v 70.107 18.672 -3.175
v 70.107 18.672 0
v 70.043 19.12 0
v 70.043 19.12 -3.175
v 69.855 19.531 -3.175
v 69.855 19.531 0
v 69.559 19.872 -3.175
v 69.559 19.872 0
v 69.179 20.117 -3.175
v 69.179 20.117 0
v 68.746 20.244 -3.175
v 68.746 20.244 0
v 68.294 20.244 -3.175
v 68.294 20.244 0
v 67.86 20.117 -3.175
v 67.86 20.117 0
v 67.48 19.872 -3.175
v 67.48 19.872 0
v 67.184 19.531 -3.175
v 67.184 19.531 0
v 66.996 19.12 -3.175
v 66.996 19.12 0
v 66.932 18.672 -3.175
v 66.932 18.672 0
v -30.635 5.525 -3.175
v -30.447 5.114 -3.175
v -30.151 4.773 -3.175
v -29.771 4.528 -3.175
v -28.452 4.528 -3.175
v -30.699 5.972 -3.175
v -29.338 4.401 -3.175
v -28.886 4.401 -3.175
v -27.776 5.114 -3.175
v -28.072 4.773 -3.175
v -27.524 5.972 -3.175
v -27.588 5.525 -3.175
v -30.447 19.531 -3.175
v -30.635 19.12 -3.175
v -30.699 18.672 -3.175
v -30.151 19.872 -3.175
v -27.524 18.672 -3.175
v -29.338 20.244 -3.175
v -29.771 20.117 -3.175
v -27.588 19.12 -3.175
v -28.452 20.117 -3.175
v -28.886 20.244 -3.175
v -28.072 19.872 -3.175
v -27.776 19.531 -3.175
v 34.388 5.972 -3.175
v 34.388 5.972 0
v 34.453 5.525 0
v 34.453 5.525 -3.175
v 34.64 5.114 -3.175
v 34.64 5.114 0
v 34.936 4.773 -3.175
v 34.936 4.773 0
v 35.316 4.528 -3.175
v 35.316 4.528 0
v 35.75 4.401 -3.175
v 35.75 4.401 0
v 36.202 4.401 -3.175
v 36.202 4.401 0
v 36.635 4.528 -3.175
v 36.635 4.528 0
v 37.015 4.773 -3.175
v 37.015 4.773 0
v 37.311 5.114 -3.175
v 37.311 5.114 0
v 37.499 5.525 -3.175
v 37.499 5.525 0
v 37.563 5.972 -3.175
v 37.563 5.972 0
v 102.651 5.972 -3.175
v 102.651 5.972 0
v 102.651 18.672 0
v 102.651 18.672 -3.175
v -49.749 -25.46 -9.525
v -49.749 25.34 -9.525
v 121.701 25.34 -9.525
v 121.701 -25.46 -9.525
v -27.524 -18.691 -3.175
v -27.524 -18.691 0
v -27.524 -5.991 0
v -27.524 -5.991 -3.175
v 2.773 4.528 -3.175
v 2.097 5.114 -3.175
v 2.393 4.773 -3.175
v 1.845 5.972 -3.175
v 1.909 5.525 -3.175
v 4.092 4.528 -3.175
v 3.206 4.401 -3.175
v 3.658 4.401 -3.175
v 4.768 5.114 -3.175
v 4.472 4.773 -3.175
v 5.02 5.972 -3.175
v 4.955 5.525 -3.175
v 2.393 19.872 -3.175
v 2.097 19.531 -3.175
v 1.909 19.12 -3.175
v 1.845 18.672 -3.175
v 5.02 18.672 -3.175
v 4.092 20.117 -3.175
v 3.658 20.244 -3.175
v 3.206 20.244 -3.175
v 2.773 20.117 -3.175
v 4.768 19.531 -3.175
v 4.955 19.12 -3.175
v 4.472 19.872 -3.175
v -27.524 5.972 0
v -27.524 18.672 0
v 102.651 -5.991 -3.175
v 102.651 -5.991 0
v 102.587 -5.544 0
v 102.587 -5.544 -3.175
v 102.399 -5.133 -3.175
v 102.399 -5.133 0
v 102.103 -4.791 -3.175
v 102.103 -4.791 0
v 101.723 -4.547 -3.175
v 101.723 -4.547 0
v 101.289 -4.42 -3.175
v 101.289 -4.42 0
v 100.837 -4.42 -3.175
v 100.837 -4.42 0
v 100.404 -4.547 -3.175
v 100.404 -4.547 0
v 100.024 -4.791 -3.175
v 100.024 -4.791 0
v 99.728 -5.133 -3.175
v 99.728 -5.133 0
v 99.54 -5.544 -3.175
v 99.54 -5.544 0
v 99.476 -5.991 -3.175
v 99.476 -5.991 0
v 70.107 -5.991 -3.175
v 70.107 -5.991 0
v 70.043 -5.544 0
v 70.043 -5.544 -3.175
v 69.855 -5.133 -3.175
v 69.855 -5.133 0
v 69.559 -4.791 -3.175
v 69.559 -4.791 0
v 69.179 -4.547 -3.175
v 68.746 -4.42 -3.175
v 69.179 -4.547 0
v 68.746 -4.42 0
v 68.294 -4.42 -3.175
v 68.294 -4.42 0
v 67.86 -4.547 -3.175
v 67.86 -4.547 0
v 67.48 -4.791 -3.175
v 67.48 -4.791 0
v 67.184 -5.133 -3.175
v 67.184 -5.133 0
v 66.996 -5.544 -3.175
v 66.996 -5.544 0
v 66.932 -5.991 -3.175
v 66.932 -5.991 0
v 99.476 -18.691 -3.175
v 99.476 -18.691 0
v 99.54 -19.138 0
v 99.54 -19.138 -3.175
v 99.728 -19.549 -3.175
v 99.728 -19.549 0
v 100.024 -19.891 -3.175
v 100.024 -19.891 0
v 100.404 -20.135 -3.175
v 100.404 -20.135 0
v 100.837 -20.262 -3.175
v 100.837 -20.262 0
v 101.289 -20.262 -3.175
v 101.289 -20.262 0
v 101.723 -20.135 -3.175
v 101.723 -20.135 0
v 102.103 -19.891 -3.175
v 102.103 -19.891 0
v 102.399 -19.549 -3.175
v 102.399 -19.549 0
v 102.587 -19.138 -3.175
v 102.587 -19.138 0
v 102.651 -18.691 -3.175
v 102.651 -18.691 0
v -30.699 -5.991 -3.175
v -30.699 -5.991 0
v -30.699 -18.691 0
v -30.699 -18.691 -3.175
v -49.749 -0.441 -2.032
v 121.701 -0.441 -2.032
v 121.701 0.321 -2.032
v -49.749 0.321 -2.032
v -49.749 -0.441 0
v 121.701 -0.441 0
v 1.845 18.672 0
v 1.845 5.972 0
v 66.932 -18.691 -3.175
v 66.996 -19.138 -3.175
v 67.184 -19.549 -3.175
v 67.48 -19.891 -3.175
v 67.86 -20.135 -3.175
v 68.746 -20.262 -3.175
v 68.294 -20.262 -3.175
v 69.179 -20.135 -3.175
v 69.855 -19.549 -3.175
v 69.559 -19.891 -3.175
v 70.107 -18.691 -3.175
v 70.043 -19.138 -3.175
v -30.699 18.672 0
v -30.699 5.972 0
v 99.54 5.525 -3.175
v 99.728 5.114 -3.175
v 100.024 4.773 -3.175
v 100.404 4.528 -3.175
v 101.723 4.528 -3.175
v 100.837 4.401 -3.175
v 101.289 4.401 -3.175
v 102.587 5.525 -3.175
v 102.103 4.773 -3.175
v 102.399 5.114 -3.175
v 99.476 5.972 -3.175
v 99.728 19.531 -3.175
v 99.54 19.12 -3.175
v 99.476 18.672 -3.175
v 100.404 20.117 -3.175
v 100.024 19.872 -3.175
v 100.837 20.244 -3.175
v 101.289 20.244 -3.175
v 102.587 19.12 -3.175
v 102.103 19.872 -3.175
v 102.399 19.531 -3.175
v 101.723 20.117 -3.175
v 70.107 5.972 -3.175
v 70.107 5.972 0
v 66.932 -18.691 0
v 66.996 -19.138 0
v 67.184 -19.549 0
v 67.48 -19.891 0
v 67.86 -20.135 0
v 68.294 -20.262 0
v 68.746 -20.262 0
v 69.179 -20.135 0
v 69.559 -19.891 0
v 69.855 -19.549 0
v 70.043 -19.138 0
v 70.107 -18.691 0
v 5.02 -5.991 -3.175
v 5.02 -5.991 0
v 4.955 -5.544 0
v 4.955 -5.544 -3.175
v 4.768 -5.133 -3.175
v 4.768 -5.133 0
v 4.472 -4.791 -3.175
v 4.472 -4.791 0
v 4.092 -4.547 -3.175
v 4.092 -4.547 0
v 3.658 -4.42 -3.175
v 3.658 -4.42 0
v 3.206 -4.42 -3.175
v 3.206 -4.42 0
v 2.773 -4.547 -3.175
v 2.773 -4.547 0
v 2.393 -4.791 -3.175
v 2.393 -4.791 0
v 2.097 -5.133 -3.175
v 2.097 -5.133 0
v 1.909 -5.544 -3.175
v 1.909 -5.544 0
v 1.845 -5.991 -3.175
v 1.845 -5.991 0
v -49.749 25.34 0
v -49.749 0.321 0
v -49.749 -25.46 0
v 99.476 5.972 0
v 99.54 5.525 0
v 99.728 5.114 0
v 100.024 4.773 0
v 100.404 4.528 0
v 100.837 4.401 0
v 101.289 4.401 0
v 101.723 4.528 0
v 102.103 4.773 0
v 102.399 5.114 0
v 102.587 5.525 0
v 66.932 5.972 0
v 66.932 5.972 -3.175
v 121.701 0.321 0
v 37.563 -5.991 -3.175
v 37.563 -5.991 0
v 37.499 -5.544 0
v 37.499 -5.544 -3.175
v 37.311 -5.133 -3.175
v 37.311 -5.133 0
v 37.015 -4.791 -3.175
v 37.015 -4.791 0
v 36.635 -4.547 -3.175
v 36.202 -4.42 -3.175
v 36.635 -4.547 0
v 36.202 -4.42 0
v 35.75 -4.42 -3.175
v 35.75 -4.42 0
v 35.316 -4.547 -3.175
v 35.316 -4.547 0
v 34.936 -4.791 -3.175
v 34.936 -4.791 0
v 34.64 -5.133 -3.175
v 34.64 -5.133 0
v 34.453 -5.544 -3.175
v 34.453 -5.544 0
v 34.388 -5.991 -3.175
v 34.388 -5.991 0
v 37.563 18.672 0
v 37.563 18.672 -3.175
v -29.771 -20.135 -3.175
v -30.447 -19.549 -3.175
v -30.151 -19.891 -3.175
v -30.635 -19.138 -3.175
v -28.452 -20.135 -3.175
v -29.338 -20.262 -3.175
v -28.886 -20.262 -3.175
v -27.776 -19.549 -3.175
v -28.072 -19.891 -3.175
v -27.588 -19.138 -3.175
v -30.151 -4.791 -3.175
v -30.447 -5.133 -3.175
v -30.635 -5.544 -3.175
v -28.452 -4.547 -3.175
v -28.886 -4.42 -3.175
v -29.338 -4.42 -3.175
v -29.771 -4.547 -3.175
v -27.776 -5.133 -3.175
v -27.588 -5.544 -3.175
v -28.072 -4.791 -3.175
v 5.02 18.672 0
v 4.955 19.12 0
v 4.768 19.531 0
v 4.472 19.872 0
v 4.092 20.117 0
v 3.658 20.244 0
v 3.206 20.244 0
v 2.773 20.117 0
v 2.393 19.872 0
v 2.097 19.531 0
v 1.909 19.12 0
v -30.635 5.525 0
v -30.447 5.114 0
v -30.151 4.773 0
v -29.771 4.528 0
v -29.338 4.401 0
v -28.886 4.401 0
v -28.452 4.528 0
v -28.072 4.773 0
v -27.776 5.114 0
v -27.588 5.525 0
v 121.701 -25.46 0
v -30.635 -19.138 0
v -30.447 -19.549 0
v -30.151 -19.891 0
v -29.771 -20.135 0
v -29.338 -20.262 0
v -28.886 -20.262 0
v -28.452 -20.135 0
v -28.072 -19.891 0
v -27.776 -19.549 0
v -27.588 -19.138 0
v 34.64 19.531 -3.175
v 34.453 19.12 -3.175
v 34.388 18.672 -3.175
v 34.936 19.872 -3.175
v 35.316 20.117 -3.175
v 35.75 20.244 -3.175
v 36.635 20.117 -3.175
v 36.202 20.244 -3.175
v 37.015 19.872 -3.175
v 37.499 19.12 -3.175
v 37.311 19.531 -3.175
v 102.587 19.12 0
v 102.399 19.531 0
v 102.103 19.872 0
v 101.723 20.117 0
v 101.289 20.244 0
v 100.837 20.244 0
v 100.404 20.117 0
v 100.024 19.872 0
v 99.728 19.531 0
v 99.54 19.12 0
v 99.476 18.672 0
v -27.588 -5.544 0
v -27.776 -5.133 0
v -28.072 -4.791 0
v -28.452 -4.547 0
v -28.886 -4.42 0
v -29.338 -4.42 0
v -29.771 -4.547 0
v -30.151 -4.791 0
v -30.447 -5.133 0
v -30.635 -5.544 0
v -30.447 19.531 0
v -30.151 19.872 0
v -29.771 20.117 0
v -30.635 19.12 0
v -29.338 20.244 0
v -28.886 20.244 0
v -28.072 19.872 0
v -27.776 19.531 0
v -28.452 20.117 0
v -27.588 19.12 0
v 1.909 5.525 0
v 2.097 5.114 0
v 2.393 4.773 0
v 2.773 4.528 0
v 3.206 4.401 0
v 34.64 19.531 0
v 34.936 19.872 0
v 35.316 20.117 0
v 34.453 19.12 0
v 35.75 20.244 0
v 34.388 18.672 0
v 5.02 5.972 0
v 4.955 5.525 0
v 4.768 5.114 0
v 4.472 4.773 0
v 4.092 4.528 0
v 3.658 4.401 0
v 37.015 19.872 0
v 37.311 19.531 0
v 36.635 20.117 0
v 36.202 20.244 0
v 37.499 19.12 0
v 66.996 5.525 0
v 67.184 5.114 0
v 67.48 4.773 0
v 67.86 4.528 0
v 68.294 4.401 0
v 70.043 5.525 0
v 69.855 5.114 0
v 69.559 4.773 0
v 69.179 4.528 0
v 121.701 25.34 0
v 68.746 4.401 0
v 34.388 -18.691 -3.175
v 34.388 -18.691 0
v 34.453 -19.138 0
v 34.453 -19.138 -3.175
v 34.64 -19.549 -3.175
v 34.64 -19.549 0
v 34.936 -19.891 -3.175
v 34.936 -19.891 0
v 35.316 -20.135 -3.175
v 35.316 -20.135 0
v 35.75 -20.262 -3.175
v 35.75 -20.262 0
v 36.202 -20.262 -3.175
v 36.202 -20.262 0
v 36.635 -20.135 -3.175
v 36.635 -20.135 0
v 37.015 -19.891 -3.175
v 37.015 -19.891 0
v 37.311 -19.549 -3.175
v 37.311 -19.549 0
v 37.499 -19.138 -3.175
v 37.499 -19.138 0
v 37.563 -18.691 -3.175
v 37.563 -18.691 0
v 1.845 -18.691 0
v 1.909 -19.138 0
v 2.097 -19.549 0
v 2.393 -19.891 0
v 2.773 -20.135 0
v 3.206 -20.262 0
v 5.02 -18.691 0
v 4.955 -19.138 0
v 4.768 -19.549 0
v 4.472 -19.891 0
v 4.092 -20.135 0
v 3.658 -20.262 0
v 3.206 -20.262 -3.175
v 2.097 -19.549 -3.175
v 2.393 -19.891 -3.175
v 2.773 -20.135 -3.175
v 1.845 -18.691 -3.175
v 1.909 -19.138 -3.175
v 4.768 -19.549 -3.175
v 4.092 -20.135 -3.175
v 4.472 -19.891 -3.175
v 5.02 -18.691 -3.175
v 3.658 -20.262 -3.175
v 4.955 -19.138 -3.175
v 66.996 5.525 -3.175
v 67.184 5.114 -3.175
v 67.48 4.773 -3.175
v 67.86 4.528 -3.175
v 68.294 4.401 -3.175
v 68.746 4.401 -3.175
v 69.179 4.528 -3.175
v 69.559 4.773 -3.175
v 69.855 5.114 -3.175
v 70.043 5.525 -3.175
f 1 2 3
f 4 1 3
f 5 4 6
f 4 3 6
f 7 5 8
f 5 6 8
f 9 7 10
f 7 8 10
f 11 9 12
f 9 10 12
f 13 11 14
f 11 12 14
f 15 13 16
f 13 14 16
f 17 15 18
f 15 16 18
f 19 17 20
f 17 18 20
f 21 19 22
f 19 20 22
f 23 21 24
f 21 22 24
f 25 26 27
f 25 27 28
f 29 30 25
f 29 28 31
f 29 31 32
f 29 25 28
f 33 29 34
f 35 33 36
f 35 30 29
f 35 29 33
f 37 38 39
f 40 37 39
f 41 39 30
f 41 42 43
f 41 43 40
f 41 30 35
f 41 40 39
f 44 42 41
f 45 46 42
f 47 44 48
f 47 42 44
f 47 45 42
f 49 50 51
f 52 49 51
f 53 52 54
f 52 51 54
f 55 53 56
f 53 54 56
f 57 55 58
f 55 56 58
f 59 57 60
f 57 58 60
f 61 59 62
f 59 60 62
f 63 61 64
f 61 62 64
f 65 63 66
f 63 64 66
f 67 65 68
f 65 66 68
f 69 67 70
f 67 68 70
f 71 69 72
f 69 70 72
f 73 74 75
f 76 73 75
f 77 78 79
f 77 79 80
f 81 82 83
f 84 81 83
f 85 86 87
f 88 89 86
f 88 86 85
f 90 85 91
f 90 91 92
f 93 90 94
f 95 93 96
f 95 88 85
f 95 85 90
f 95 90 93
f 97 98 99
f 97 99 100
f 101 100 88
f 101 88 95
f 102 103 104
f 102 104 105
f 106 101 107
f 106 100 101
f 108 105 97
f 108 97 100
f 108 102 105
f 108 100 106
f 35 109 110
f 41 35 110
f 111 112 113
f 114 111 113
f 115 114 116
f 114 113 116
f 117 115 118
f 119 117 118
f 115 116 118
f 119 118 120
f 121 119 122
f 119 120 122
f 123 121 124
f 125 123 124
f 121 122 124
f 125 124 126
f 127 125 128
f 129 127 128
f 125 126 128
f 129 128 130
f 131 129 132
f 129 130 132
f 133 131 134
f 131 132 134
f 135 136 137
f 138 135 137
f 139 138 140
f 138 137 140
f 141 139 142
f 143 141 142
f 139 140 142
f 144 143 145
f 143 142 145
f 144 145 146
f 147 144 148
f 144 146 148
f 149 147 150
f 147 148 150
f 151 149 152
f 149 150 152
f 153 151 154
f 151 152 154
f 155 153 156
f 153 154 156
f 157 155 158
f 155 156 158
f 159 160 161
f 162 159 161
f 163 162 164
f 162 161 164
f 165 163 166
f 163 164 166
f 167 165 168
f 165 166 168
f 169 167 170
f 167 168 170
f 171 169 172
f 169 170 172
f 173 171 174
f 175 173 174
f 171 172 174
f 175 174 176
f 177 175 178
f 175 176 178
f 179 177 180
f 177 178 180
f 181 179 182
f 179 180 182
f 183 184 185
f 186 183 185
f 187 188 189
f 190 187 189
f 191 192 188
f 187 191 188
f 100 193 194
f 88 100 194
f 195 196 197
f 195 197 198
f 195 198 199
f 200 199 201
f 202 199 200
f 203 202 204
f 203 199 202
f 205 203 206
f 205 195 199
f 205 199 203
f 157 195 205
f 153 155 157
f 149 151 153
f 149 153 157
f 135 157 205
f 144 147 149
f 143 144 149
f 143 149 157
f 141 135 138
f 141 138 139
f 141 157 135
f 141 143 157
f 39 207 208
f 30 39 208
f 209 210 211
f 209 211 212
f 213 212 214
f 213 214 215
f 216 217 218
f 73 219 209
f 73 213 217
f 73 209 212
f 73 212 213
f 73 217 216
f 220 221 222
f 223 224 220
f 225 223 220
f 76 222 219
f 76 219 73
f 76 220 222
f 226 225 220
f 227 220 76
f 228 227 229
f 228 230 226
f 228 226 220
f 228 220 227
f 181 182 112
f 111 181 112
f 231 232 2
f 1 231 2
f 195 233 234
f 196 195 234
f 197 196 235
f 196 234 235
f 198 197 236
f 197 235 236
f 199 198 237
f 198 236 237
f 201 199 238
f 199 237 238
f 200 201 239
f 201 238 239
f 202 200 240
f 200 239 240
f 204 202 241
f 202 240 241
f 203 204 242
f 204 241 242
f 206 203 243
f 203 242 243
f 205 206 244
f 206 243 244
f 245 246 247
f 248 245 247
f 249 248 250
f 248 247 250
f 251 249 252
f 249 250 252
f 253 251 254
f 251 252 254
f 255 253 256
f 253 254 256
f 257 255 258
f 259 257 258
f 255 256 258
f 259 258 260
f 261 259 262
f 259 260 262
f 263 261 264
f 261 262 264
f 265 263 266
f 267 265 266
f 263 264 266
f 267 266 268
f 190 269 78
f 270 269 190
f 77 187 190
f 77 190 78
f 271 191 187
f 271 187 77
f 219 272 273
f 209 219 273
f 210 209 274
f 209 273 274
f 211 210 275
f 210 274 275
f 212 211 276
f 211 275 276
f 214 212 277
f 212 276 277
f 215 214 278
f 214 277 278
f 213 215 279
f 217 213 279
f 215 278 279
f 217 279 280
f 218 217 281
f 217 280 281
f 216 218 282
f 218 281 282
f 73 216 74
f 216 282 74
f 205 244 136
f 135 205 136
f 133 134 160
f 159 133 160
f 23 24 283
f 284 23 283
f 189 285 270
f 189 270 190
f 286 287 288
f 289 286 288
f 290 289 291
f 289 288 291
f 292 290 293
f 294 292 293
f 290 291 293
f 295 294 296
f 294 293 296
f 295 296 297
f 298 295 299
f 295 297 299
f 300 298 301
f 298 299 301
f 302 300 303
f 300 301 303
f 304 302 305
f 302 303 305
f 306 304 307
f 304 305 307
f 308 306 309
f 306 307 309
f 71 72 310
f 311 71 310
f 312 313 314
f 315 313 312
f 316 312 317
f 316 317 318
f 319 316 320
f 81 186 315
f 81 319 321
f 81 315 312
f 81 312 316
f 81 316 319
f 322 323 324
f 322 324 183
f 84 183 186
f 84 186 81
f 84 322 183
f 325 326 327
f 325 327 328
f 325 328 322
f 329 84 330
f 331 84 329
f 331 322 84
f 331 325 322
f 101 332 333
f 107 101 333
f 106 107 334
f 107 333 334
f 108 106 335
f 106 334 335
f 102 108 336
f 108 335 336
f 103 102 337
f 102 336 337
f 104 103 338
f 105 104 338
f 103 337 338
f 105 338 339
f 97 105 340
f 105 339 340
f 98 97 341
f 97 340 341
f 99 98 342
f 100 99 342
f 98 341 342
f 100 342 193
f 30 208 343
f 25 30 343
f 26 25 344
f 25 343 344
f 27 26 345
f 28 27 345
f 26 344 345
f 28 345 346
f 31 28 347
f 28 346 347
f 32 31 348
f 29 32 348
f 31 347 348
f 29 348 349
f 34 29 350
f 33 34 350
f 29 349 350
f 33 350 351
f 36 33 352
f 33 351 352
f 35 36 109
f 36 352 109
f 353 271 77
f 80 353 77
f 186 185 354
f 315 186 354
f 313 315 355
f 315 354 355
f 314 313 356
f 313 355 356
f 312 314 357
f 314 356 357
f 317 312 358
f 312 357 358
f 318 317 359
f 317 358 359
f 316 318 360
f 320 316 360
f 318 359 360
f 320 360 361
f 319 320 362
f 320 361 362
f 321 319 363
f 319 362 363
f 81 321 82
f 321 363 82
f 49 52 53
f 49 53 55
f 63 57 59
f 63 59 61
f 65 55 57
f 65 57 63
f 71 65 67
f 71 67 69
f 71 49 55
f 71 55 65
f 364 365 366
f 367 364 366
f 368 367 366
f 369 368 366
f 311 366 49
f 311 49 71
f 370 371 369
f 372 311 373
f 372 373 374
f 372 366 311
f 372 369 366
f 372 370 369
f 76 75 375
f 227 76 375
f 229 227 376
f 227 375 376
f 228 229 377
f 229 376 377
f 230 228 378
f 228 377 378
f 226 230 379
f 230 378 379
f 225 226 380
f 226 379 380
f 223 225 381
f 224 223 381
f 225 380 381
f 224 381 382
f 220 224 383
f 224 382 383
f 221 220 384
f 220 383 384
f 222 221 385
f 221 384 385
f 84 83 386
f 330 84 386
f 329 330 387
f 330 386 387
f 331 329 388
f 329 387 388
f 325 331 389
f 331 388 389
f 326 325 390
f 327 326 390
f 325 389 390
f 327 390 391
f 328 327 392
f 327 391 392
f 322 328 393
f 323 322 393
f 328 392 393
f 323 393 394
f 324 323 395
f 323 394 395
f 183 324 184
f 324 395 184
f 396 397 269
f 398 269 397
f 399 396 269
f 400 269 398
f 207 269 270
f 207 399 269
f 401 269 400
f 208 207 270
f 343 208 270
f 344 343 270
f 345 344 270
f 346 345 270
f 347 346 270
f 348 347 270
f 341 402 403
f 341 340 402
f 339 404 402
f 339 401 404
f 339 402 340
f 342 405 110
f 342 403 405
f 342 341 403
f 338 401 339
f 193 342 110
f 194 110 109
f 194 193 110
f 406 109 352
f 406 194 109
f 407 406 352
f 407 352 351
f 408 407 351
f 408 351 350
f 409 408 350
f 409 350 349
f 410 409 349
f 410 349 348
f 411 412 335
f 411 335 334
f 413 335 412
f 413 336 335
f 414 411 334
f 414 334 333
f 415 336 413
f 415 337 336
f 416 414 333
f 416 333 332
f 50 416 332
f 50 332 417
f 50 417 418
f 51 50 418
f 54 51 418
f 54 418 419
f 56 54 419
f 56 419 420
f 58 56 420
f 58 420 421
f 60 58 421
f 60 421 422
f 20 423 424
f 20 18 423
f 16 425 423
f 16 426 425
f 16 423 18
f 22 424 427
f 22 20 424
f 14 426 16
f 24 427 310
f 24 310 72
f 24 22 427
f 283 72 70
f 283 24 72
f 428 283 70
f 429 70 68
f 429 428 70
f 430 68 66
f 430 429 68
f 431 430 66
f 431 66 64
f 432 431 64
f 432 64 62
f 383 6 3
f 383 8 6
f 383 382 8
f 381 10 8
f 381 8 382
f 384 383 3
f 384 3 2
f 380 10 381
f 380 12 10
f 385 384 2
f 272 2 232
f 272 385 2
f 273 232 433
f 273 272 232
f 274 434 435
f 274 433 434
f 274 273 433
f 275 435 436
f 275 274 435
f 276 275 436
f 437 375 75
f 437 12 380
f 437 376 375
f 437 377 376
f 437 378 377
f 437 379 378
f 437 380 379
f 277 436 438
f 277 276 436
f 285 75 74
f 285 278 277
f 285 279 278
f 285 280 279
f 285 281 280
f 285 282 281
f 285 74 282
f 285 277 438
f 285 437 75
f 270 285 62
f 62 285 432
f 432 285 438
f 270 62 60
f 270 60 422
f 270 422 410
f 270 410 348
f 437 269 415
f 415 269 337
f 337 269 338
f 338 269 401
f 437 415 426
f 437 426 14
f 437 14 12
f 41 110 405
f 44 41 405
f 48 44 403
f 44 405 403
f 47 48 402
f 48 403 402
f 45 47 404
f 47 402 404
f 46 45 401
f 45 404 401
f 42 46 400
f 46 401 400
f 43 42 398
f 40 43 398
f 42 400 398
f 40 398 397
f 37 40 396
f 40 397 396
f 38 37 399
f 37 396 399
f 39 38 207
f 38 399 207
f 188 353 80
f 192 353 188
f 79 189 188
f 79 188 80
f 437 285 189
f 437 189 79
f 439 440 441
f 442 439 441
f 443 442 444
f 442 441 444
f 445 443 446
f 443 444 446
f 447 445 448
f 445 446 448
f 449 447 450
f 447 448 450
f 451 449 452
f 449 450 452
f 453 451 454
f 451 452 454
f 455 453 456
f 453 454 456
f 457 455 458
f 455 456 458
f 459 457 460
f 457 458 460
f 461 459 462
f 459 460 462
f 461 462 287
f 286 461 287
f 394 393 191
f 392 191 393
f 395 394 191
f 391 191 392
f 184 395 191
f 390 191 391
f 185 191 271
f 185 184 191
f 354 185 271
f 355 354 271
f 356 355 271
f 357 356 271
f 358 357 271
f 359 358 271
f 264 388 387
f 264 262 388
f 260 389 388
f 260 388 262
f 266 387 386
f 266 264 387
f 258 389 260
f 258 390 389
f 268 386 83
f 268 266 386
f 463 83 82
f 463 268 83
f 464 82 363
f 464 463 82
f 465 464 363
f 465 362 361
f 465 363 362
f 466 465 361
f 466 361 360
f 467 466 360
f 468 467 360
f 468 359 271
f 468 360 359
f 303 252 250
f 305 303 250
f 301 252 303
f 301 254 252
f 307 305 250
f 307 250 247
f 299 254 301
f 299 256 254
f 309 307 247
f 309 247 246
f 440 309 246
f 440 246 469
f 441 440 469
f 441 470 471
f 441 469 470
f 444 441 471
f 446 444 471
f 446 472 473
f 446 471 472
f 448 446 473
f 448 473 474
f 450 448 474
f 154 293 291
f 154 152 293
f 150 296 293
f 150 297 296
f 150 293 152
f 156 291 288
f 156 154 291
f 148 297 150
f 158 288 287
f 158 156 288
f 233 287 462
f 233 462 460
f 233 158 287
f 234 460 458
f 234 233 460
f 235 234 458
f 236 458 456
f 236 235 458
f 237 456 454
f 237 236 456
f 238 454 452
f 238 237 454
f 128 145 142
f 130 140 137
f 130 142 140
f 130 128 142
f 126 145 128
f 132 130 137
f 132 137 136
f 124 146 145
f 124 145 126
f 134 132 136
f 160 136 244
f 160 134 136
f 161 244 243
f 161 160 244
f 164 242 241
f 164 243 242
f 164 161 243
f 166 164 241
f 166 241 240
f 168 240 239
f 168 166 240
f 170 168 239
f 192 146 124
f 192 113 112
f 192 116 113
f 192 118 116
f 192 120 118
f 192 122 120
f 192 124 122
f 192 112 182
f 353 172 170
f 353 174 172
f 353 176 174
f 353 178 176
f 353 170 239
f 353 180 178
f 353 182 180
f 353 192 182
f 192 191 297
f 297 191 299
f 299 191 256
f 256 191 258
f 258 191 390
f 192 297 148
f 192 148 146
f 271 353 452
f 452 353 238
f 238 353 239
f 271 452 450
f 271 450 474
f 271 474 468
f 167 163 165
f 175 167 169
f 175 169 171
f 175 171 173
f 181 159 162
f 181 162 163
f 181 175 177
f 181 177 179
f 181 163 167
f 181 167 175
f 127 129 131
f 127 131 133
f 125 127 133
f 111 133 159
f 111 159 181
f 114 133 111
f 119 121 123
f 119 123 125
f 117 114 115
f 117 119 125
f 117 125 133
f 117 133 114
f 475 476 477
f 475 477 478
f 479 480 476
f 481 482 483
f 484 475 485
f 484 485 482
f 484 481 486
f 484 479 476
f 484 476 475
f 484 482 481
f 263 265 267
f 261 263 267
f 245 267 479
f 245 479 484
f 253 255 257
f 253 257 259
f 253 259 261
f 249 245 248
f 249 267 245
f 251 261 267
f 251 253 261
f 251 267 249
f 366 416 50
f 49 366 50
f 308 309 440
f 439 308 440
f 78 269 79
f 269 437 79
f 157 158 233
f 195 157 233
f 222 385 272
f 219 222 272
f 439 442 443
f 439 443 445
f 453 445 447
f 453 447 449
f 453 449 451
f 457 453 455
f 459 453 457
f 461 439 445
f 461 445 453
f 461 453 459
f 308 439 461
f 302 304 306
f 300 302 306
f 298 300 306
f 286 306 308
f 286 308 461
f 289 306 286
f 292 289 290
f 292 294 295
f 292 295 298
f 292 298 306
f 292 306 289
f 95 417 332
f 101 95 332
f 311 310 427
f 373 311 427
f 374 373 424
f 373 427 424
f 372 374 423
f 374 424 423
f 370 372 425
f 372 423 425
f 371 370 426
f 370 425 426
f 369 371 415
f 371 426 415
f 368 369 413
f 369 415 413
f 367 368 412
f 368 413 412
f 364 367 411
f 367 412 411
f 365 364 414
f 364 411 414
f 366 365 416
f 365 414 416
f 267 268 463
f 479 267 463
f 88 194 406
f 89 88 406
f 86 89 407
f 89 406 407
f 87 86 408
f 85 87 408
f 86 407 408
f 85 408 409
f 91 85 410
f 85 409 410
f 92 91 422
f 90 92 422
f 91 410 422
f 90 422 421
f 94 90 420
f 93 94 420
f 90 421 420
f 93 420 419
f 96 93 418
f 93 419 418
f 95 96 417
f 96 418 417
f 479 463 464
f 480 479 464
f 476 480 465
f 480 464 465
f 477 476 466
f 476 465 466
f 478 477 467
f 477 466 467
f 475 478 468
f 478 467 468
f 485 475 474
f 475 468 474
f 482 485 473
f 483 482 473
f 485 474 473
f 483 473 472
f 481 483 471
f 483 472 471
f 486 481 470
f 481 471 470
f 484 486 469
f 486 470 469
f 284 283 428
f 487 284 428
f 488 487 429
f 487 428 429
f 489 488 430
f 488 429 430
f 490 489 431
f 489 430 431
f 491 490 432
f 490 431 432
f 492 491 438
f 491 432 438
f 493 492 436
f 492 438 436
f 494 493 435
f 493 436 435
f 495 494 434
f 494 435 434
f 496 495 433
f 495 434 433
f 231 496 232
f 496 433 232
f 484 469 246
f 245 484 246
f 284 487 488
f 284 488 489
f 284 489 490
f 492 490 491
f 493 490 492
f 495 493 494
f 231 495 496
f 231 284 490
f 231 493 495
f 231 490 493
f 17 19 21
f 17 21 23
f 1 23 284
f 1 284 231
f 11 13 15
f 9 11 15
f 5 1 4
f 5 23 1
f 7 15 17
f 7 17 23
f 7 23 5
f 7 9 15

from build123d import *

# Parameters (mm, degrees)
F0_W     = 152.4
F0_H     = 25.019
F0_H_2   = 0.762
F1_DEPTH = 9.525
F2_DEPTH = 2.032
F4_DEPTH = 3.175
F5_DEPTH = 9.525
F6_DEPTH = 9.525


with BuildPart() as f1:
    # F0 (on Top) → F1 (new body)
    with BuildSketch(Plane.XY):
        with Locations((35.9758849268, -12.9505327462)):
            Rectangle(F0_W, F0_H)
        with Locations((35.9758849268, 12.8304672538)):
            Rectangle(F0_W, F0_H)
        with Locations((35.9758849268, -0.0600327462)):
            Rectangle(F0_W, F0_H_2)
    extrude(amount=-F1_DEPTH)

    # F0 (on Top) → F2 (cut)
    with BuildSketch(Plane.XY):
        with Locations((35.9758849268, -0.0600327462)):
            Rectangle(F0_W, F0_H_2)
    extrude(amount=-F2_DEPTH, mode=Mode.SUBTRACT)

    # F3 (on face) → F4 (cut)
    with BuildSketch(Plane.XY):
        with BuildLine():
            Line((-30.6991150732, 18.6724672538), (-30.6991150732, 5.9724672538))
            ThreePointArc((-30.6991150732, 5.9724672538), (-29.1116150732, 4.3849672538), (-27.5241150732, 5.9724672538))
            Line((-27.5241150732, 5.9724672538), (-27.5241150732, 18.6724672538))
            ThreePointArc((-27.5241150732, 18.6724672538), (-29.1116150732, 20.2599672538), (-30.6991150732, 18.6724672538))
        make_face()
        with BuildLine():
            Line((99.4758849268, -5.9909327462), (99.4758849268, -18.6909327462))
            ThreePointArc((99.4758849268, -18.6909327462), (101.0633849268, -20.2784327462), (102.6508849268, -18.6909327462))
            Line((102.6508849268, -18.6909327462), (102.6508849268, -5.9909327462))
            ThreePointArc((102.6508849268, -5.9909327462), (101.0633849268, -4.4034327462), (99.4758849268, -5.9909327462))
        make_face()
        with BuildLine():
            Line((-30.6991150732, -5.9909327462), (-30.6991150732, -18.6909327462))
            ThreePointArc((-30.6991150732, -18.6909327462), (-29.1116150732, -20.2784327462), (-27.5241150732, -18.6909327462))
            Line((-27.5241150732, -18.6909327462), (-27.5241150732, -5.9909327462))
            ThreePointArc((-27.5241150732, -5.9909327462), (-29.1116150732, -4.4034327462), (-30.6991150732, -5.9909327462))
        make_face()
        with BuildLine():
            Line((1.8446349268, -5.9909327462), (1.8446349268, -18.6909327462))
            ThreePointArc((1.8446349268, -18.6909327462), (3.4321349268, -20.2784327462), (5.0196349268, -18.6909327462))
            Line((5.0196349268, -18.6909327462), (5.0196349268, -5.9909327462))
            ThreePointArc((5.0196349268, -5.9909327462), (3.4321349268, -4.4034327462), (1.8446349268, -5.9909327462))
        make_face()
        with BuildLine():
            Line((34.3883849268, -5.9909327462), (34.3883849268, -18.6909327462))
            ThreePointArc((34.3883849268, -18.6909327462), (35.9758849268, -20.2784327462), (37.5633849268, -18.6909327462))
            Line((37.5633849268, -18.6909327462), (37.5633849268, -5.9909327462))
            ThreePointArc((37.5633849268, -5.9909327462), (35.9758849268, -4.4034327462), (34.3883849268, -5.9909327462))
        make_face()
        with BuildLine():
            Line((66.9321349268, -5.9909327462), (66.9321349268, -18.6909327462))
            ThreePointArc((66.9321349268, -18.6909327462), (68.5196349268, -20.2784327462), (70.1071349268, -18.6909327462))
            Line((70.1071349268, -18.6909327462), (70.1071349268, -5.9909327462))
            ThreePointArc((70.1071349268, -5.9909327462), (68.5196349268, -4.4034327462), (66.9321349268, -5.9909327462))
        make_face()
        with BuildLine():
            Line((1.8446349268, 18.6724672538), (1.8446349268, 5.9724672538))
            ThreePointArc((1.8446349268, 5.9724672538), (3.4321349268, 4.3849672538), (5.0196349268, 5.9724672538))
            Line((5.0196349268, 5.9724672538), (5.0196349268, 18.6724672538))
            ThreePointArc((5.0196349268, 18.6724672538), (3.4321349268, 20.2599672538), (1.8446349268, 18.6724672538))
        make_face()
        with BuildLine():
            Line((34.3883849268, 18.6724672538), (34.3883849268, 5.9724672538))
            ThreePointArc((34.3883849268, 5.9724672538), (35.9758849268, 4.3849672538), (37.5633849268, 5.9724672538))
            Line((37.5633849268, 5.9724672538), (37.5633849268, 18.6724672538))
            ThreePointArc((37.5633849268, 18.6724672538), (35.9758849268, 20.2599672538), (34.3883849268, 18.6724672538))
        make_face()
        with BuildLine():
            Line((66.9321349268, 18.6724672538), (66.9321349268, 5.9724672538))
            ThreePointArc((66.9321349268, 5.9724672538), (68.5196349268, 4.3849672538), (70.1071349268, 5.9724672538))
            Line((70.1071349268, 5.9724672538), (70.1071349268, 18.6724672538))
            ThreePointArc((70.1071349268, 18.6724672538), (68.5196349268, 20.2599672538), (66.9321349268, 18.6724672538))
        make_face()
        with BuildLine():
            Line((99.4758849268, 18.6724672538), (99.4758849268, 5.9724672538))
            ThreePointArc((99.4758849268, 5.9724672538), (101.0633849268, 4.3849672538), (102.6508849268, 5.9724672538))
            Line((102.6508849268, 5.9724672538), (102.6508849268, 18.6724672538))
            ThreePointArc((102.6508849268, 18.6724672538), (101.0633849268, 20.2599672538), (99.4758849268, 18.6724672538))
        make_face()
    extrude(amount=-F4_DEPTH, mode=Mode.SUBTRACT)

    # F5 (add): a face of the model
    f5_faces = [f1.faces().sort_by_distance(p)[0] for p in [
        (112.1758849268, -0.0600327462, -4.7745272873),
    ]]
    extrude(f5_faces, amount=F5_DEPTH)

    # F6 (add): a face of the model
    f6_faces = [f1.faces().sort_by_distance(p)[0] for p in [
        (-40.2241150732, -0.0600327462, -4.7745272873),
    ]]
    extrude(f6_faces, amount=F6_DEPTH)


solid = f1.part
